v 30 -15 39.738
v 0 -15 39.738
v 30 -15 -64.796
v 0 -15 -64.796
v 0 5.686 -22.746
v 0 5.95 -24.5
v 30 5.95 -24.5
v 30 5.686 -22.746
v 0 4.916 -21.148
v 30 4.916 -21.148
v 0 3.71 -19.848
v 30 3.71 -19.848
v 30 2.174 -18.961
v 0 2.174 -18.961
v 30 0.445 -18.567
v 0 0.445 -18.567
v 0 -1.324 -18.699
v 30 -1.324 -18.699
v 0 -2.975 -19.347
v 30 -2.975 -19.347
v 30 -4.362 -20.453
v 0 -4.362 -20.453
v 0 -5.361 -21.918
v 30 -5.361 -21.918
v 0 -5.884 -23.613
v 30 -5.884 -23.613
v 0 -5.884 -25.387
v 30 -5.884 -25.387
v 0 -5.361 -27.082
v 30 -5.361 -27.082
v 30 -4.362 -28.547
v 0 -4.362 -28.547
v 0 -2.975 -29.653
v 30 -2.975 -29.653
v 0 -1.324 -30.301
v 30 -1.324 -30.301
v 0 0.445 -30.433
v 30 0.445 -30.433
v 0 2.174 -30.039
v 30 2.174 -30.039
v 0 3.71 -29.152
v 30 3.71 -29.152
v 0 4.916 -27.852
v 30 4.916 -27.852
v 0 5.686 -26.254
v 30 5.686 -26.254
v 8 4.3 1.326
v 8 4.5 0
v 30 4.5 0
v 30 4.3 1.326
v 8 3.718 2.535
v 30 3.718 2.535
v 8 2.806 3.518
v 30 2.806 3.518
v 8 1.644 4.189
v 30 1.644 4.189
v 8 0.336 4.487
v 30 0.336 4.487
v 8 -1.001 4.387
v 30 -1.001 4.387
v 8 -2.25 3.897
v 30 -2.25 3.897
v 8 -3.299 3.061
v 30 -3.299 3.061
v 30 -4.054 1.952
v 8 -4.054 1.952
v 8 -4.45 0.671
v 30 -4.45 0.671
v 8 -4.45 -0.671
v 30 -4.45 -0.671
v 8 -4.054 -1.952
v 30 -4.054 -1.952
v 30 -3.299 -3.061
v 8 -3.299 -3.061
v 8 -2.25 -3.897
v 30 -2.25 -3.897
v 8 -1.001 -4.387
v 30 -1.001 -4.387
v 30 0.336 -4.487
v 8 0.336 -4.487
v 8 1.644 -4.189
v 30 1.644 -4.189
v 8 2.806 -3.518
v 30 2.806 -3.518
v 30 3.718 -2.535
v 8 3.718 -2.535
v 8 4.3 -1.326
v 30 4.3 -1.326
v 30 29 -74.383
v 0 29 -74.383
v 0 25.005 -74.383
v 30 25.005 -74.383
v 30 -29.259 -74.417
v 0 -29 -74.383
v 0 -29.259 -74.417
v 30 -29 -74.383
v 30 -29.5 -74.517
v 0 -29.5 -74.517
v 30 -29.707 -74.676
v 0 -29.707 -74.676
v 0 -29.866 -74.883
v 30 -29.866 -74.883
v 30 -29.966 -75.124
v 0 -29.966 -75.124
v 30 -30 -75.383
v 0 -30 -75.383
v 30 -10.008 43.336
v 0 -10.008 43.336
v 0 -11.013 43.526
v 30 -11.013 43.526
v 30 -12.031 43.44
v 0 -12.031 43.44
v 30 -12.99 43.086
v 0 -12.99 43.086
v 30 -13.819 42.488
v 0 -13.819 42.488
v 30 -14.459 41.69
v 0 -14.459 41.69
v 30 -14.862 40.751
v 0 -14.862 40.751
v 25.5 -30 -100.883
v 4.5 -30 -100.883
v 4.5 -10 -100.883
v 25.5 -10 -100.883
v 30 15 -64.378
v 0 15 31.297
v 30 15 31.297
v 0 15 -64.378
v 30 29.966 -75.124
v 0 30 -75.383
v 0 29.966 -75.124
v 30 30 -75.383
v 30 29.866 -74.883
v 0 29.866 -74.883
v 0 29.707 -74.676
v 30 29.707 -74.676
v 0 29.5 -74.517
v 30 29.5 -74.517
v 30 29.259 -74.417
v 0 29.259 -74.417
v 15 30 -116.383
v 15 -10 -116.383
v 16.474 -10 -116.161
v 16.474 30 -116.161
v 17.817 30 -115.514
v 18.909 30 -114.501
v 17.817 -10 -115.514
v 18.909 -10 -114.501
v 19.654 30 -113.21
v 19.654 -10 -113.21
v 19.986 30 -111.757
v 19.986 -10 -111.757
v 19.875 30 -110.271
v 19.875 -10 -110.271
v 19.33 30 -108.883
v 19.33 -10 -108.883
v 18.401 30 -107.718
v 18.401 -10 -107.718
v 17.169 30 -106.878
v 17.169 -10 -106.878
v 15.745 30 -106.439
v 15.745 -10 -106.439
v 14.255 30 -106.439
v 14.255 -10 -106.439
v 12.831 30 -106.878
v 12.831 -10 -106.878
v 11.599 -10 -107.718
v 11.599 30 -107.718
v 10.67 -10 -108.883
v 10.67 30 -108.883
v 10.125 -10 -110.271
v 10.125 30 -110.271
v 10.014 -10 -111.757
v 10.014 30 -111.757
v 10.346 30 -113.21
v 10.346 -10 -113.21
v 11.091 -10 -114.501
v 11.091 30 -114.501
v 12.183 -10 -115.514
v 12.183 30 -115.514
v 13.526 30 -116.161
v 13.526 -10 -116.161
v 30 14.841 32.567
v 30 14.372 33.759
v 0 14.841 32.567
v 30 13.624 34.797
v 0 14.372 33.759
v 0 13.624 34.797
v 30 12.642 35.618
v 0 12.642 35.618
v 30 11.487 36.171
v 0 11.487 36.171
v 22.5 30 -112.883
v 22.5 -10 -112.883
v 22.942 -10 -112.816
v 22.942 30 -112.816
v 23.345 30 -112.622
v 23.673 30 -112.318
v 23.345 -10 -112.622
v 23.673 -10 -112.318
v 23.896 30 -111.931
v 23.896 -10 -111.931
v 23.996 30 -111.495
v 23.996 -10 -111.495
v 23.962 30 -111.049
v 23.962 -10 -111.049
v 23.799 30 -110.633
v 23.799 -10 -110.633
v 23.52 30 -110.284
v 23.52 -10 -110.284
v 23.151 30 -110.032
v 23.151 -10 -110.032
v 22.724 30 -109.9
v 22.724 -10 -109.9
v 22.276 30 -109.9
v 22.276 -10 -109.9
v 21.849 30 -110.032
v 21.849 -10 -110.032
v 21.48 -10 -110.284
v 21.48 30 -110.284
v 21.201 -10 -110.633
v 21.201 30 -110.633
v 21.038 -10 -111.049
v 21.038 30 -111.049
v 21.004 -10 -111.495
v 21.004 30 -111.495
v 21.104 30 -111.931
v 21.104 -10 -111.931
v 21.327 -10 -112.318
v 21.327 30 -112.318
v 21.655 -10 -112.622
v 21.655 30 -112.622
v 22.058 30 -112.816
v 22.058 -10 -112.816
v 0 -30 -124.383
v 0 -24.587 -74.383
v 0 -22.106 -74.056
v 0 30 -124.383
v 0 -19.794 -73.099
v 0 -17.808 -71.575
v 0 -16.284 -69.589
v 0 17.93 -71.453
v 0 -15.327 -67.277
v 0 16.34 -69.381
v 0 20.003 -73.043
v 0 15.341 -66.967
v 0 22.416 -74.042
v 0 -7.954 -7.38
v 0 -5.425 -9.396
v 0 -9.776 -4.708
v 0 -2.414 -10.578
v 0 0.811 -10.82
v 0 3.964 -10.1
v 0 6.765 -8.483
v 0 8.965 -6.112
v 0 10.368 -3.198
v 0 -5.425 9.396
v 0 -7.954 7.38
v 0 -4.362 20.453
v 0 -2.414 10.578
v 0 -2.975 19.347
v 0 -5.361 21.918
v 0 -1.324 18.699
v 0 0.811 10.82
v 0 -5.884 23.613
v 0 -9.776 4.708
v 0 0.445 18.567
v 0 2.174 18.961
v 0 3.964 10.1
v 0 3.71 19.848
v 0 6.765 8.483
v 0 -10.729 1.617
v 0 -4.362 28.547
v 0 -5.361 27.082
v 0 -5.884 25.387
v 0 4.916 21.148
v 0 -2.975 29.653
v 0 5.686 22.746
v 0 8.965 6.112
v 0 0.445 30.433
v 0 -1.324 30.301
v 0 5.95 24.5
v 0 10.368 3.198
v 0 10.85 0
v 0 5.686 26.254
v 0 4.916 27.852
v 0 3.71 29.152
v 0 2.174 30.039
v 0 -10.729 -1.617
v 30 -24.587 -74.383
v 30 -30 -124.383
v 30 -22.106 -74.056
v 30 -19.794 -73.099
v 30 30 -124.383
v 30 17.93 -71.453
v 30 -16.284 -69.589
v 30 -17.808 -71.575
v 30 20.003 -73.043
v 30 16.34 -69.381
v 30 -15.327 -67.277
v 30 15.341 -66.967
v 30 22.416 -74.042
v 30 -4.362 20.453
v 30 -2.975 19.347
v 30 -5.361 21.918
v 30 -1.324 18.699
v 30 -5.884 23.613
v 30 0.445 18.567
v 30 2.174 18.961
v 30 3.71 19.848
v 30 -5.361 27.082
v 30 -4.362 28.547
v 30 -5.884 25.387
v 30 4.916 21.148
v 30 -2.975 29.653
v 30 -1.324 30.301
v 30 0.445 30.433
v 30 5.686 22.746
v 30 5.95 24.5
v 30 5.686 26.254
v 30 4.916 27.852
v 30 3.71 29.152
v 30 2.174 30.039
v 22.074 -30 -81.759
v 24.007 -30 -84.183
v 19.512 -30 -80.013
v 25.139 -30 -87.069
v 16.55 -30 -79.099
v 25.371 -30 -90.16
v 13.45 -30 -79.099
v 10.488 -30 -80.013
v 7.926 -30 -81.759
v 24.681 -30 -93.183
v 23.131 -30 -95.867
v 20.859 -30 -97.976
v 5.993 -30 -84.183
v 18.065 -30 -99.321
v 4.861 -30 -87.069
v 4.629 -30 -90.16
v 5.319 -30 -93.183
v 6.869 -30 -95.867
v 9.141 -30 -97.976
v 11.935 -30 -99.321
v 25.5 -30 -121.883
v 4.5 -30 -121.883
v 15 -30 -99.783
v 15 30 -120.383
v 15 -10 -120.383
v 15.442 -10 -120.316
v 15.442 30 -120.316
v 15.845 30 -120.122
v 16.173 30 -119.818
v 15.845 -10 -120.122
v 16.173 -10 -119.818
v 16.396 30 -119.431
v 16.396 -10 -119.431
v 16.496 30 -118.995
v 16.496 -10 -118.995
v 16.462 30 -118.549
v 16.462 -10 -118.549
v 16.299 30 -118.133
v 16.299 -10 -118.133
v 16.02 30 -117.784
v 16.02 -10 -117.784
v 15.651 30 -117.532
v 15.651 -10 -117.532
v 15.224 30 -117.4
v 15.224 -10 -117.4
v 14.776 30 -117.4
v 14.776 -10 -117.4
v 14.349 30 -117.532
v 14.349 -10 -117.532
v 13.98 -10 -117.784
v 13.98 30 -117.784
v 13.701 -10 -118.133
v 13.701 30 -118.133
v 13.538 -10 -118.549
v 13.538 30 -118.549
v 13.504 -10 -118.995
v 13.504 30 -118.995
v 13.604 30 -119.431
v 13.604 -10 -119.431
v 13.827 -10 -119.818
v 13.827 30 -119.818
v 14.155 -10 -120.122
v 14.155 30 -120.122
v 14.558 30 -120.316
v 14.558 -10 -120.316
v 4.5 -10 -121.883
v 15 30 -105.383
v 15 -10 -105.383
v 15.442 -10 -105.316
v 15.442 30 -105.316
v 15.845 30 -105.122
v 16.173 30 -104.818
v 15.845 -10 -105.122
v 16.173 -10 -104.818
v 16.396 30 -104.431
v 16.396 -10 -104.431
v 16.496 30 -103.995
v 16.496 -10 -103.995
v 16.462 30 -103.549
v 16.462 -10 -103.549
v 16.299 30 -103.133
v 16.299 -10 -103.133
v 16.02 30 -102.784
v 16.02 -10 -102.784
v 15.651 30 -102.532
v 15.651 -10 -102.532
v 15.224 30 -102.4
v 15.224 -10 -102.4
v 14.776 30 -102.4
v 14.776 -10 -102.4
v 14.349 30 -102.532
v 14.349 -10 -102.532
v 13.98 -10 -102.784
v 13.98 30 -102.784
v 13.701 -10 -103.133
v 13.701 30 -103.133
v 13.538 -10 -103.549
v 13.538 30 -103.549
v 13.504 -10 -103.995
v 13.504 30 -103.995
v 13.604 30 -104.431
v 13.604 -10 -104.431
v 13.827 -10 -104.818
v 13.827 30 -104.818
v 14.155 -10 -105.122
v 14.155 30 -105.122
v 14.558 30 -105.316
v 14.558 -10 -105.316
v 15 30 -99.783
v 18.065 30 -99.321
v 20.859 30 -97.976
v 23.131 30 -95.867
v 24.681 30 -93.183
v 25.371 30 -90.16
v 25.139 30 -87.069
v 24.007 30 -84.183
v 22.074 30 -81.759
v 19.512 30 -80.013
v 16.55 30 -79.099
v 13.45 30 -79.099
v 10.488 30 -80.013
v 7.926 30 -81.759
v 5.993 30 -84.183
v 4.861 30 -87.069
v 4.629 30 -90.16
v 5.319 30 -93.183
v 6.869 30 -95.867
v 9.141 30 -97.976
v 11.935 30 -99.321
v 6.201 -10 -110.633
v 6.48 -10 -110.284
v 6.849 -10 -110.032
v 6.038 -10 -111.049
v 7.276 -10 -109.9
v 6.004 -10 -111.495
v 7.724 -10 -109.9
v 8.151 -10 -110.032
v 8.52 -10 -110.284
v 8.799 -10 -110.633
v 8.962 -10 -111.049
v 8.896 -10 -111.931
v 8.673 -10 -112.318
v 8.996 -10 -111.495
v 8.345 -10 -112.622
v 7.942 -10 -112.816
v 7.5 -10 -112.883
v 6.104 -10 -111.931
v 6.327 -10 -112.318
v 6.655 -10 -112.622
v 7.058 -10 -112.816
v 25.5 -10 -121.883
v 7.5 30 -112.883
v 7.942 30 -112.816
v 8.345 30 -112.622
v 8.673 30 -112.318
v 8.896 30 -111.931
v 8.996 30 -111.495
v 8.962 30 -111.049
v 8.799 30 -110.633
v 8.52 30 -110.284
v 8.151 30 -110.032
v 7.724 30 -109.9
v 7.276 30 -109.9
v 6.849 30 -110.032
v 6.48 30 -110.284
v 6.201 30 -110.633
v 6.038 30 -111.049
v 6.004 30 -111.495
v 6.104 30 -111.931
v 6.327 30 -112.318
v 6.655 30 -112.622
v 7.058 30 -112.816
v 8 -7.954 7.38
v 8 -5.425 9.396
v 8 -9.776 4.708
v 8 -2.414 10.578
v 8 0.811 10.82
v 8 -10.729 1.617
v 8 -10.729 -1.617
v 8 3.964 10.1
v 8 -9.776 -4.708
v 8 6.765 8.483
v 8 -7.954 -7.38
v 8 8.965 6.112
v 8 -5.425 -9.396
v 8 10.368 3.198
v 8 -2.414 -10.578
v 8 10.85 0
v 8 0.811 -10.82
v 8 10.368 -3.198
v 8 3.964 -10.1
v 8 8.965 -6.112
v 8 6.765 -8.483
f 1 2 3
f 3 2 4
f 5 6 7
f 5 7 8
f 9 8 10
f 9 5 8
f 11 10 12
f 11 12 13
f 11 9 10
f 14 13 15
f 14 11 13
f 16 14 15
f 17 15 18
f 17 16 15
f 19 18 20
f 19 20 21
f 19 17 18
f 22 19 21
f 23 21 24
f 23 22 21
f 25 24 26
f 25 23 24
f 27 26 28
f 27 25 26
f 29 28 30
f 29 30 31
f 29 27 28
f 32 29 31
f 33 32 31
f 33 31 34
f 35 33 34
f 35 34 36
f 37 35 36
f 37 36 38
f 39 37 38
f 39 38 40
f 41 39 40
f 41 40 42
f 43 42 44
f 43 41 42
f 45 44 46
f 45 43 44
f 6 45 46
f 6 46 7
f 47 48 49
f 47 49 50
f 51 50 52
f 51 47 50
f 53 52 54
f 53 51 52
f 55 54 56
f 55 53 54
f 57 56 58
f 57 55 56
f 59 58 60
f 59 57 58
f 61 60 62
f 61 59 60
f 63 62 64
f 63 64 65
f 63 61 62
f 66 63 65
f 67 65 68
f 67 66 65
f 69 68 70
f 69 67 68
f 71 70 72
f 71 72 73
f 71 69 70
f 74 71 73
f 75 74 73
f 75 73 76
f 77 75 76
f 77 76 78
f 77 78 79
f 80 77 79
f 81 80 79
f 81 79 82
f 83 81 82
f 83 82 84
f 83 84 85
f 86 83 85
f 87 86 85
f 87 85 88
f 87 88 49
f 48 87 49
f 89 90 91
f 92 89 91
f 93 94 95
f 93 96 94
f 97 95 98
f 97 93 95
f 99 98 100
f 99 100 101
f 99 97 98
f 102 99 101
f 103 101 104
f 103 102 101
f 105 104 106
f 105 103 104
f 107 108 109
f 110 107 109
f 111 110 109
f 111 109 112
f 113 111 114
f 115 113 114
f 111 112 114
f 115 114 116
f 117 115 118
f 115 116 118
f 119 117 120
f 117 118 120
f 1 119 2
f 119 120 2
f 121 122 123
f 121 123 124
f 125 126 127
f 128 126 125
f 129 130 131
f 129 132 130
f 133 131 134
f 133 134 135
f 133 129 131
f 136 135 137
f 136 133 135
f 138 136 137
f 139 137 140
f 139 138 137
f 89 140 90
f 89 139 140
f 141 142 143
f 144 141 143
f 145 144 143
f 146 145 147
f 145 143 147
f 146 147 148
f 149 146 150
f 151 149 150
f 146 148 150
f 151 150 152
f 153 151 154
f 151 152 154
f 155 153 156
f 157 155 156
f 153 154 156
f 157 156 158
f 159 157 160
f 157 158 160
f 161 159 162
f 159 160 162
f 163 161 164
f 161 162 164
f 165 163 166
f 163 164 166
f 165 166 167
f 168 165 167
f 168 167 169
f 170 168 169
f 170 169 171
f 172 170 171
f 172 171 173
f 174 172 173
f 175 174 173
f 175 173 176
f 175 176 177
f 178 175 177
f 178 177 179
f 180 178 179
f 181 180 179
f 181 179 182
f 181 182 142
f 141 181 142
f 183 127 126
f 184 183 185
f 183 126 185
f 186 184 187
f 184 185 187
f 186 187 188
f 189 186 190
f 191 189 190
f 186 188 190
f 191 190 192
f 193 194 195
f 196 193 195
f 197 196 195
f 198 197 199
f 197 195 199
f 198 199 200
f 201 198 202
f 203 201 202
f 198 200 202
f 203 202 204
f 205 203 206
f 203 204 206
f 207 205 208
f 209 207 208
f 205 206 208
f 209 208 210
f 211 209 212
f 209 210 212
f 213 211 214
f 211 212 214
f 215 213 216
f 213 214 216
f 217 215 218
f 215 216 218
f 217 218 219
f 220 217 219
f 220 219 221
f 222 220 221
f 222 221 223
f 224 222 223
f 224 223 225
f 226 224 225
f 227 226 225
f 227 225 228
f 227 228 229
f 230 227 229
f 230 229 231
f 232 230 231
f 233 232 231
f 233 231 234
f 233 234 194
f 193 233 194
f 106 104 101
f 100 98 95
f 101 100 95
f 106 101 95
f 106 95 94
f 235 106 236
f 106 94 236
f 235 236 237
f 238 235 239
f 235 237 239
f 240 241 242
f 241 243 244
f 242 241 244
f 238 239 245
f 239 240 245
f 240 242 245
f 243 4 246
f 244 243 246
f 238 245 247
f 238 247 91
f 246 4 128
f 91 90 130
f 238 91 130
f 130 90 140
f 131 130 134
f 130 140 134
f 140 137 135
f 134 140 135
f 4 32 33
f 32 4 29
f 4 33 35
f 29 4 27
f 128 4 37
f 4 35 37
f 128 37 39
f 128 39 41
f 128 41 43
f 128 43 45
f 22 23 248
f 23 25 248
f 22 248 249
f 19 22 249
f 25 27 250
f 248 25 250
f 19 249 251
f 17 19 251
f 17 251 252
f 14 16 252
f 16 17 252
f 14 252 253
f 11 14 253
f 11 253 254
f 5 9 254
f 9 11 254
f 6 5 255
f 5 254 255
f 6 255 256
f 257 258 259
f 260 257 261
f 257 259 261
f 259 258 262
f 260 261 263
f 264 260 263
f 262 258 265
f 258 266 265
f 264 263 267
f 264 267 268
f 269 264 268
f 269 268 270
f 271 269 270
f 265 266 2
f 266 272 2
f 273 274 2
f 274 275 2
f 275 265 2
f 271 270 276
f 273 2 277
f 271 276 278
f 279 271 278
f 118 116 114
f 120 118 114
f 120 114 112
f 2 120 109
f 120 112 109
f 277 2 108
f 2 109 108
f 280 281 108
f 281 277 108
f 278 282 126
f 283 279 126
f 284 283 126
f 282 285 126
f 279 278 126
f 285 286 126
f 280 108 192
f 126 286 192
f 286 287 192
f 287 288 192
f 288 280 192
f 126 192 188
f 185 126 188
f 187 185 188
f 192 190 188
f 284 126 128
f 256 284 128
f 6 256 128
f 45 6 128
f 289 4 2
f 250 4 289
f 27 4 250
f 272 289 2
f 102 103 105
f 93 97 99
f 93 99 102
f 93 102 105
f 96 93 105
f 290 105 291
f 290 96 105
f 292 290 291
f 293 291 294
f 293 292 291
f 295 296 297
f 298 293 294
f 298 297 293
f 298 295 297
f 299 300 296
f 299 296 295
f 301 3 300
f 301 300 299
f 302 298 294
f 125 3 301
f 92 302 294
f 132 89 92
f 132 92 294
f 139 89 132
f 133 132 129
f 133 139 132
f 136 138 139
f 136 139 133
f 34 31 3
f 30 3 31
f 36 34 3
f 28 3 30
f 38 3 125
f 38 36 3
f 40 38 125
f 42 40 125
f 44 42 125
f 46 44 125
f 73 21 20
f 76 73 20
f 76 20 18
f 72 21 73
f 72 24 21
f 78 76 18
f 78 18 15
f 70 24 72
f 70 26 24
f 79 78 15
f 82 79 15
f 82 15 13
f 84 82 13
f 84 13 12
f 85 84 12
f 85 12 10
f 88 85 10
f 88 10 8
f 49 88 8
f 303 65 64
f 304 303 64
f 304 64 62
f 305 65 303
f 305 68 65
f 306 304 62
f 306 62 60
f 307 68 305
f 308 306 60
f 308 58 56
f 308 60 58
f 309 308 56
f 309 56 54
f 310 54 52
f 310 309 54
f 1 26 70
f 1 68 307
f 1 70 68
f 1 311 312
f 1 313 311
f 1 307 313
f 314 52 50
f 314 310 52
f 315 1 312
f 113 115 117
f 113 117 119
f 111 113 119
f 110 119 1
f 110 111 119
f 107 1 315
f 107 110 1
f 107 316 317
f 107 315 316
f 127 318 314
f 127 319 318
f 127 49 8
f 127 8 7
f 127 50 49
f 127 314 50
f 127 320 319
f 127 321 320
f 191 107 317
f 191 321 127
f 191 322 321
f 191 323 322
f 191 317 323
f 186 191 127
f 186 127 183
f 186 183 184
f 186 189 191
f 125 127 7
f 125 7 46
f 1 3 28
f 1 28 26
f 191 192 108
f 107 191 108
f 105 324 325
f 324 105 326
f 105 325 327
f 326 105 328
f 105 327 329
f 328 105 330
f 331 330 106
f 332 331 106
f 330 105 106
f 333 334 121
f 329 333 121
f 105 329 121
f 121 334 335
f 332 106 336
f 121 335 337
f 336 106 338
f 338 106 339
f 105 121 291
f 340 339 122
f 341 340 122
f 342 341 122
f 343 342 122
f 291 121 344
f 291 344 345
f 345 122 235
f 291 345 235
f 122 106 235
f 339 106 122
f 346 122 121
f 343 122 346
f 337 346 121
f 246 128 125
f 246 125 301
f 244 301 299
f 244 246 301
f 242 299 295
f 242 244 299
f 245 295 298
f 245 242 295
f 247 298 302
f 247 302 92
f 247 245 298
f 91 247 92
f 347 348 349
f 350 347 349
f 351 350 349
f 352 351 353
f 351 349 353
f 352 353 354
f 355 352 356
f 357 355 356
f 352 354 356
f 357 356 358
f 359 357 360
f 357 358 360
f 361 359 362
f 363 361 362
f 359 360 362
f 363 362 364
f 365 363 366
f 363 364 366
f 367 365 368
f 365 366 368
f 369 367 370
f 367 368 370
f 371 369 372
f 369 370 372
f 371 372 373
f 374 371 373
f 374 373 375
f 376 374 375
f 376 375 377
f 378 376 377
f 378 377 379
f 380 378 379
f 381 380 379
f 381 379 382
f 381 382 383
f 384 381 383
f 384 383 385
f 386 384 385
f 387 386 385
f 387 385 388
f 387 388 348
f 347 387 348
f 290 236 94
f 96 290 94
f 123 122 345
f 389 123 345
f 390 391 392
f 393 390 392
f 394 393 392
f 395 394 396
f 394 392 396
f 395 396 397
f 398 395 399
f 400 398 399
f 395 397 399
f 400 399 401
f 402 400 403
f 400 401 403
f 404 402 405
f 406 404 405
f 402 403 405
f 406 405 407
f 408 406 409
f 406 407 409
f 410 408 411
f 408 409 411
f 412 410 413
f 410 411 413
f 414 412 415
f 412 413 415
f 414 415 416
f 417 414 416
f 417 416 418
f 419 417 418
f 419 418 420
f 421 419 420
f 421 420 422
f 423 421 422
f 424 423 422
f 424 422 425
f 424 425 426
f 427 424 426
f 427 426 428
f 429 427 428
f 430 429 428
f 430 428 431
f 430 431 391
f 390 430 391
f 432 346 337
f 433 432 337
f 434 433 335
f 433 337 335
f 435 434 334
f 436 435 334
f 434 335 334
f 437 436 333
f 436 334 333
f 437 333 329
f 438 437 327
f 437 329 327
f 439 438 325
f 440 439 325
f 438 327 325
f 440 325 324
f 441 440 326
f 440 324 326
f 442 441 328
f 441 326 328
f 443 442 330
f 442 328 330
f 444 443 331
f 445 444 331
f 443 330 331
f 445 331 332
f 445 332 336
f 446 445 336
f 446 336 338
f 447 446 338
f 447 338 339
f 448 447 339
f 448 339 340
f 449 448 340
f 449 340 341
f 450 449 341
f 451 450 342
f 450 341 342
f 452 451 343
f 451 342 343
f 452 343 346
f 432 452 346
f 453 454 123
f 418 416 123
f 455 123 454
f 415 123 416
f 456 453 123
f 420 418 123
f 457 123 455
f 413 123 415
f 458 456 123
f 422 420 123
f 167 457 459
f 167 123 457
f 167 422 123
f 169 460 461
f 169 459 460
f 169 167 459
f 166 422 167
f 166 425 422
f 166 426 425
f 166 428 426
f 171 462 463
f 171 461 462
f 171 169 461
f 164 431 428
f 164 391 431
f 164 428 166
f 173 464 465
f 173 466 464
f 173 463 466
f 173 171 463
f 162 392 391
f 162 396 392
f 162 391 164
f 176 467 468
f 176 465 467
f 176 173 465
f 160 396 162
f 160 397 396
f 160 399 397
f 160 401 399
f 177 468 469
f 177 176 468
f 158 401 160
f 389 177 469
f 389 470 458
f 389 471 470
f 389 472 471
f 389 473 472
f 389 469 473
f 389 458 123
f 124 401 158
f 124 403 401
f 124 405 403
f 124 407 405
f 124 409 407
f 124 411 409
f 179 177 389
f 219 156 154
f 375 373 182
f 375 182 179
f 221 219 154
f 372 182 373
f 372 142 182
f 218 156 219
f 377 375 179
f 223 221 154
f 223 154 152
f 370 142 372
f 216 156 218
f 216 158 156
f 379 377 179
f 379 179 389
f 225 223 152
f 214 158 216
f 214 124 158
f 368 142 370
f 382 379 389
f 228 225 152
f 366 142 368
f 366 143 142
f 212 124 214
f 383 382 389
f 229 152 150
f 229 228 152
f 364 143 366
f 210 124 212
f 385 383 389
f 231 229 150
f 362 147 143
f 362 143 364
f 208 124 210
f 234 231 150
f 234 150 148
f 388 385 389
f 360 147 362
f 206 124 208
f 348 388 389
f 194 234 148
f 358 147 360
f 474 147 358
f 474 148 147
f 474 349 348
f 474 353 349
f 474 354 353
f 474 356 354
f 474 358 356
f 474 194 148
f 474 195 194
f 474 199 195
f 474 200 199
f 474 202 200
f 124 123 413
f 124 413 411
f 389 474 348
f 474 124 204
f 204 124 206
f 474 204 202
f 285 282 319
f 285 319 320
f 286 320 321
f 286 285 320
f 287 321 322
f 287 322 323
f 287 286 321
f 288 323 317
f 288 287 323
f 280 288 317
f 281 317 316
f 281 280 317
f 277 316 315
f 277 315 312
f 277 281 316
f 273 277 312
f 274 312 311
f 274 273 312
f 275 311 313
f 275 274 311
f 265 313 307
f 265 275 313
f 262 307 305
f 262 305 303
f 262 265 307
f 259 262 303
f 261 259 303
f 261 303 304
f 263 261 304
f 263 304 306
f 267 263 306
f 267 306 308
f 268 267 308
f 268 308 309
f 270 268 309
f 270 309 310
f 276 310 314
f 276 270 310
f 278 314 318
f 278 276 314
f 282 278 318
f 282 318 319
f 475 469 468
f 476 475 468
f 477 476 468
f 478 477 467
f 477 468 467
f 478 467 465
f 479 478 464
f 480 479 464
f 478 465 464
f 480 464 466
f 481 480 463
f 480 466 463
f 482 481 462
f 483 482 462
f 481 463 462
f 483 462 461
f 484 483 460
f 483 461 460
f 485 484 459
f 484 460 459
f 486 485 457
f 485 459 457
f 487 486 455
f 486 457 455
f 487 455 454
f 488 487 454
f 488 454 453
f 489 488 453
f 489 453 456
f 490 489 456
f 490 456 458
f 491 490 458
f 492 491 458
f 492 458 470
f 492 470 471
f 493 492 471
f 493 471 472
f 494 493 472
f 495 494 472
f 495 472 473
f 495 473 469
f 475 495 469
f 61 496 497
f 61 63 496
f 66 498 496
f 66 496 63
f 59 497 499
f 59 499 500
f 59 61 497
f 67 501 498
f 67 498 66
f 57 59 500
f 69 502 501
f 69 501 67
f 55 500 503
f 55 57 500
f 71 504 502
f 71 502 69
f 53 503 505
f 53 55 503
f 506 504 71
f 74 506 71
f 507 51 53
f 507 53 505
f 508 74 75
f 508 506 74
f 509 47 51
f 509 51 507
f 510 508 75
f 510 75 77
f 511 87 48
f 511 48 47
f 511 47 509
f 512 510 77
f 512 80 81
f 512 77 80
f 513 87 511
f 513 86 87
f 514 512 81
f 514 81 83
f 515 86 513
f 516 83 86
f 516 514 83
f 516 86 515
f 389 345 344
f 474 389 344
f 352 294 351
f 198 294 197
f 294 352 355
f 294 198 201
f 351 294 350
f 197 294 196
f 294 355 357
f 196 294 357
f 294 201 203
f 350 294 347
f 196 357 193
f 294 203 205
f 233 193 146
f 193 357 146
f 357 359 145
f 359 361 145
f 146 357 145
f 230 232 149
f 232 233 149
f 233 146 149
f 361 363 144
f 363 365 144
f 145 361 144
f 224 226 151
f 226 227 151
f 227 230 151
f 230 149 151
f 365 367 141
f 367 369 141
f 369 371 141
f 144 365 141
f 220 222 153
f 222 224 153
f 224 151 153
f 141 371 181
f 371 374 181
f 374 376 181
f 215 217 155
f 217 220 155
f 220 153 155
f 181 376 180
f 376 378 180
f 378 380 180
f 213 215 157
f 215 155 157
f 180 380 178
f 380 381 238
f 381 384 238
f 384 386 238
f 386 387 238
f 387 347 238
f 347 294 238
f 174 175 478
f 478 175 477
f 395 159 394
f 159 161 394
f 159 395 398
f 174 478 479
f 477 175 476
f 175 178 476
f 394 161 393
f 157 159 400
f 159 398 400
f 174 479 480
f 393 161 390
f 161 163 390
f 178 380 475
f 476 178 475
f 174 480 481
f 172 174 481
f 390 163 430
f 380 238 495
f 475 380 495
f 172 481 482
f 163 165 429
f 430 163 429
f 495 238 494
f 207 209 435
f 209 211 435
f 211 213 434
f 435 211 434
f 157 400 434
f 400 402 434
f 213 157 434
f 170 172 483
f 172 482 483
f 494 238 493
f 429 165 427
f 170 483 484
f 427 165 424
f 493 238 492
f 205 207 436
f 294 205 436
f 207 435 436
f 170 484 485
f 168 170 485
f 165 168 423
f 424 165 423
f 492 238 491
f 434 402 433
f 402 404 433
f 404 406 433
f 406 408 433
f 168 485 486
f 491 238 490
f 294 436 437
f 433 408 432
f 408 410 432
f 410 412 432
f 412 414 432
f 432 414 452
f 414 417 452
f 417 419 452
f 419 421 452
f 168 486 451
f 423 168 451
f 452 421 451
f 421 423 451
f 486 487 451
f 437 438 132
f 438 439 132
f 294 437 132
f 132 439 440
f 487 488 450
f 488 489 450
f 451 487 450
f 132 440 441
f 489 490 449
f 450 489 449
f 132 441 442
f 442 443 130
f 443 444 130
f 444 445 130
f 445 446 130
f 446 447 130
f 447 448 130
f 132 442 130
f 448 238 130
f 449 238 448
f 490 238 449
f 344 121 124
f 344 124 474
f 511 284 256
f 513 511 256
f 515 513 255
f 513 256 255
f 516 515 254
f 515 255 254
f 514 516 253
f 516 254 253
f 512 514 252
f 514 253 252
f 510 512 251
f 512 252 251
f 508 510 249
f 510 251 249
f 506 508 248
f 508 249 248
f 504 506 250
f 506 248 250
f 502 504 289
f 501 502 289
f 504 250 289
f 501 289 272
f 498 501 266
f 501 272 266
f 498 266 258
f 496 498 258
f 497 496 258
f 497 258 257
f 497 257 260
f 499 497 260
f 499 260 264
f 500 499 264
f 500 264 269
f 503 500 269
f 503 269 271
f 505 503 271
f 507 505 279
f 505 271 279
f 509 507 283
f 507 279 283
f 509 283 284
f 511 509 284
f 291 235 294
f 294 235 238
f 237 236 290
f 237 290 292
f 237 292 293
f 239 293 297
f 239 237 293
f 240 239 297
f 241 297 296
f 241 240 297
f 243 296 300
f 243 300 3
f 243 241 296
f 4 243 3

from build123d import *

# Parameters (mm, degrees)
SKETCH_R        = 5.95
SKETCH_R_2      = 4.5
PAD_DEPTH       = 30
SKETCH001_R     = 10.85
POCKET_DEPTH    = 8
SKETCH002_R     = 10.4
SKETCH002_R_2   = 5
SKETCH002_R_3   = 1.5
POCKET001_DEPTH = 60
SKETCH003_W     = 21
SKETCH003_H     = 21
POCKET002_DEPTH = 20
FILLET_R        = 1


with BuildPart() as part:
    # Sketch → Pad (new body)
    with BuildSketch(Plane.YZ):
        with BuildLine():
            Line((-15, 39.738024), (-15, -45))
            Line((-15, -45), (-15, -64.795761))
            ThreePointArc((-24.587379, -74.38314), (-17.808078, -71.575062), (-15, -64.795761))
            Line((-24.587379, -74.38314), (-30, -74.38314))
            Line((-30, -74.38314), (-30, -124.38314))
            Line((-30, -124.38314), (30, -124.38314))
            Line((30, -124.38314), (30, -74.38314))
            Line((30, -74.38314), (25.005197, -74.38314))
            ThreePointArc((15, -64.377943), (17.930454, -71.452686), (25.005197, -74.38314))
            Line((15, -45), (15, -64.377943))
            Line((15, 31.297371), (15, -45))
            ThreePointArc((15, 31.297371), (14.030328, 34.3011), (11.487377, 36.170874))
            Line((11.487377, 36.170874), (-10.008051, 43.336017))
            ThreePointArc((-10.008051, 43.336017), (-13.424965, 42.814755), (-15, 39.738024))
        make_face()
        with Locations((0, 24.5)):
            Circle(SKETCH_R, mode=Mode.SUBTRACT)
        with Locations((0, -24.5)):
            Circle(SKETCH_R, mode=Mode.SUBTRACT)
        Circle(SKETCH_R_2, mode=Mode.SUBTRACT)
    extrude(amount=PAD_DEPTH)

    # Sketch001 (on Face18 of Pad) → Pocket (cut)
    with BuildSketch(Plane(origin=(0, 0, 0), x_dir=(0, 1, 0), z_dir=(-1, 0, 0))):
        Circle(SKETCH001_R)
    extrude(amount=-POCKET_DEPTH, mode=Mode.SUBTRACT)

    # Sketch002 (on Face16 of Pocket) → Pocket001 (cut)
    with BuildSketch(Plane(origin=(0, -30, 0), x_dir=(0, 0, -1), z_dir=(0, -1, 0))):
        with Locations((89.38314, 15)):
            Circle(SKETCH002_R)
        with Locations((111.38314, 15)):
            Circle(SKETCH002_R_2)
        with Locations((111.38314, 22.5)):
            Circle(SKETCH002_R_3)
        with Locations((103.88314, 15)):
            Circle(SKETCH002_R_3)
        with Locations((111.38314, 7.5)):
            Circle(SKETCH002_R_3)
        with Locations((118.88314, 15)):
            Circle(SKETCH002_R_3)
    extrude(amount=-POCKET001_DEPTH, mode=Mode.SUBTRACT)

    # Sketch003 (on Face16 of Pocket001) → Pocket002 (cut)
    with BuildSketch(Plane(origin=(0, -30, 0), x_dir=(0, 0, -1), z_dir=(0, -1, 0))):
        with Locations((111.38314, 15)):
            Rectangle(SKETCH003_W, SKETCH003_H)
    extrude(amount=-POCKET002_DEPTH, mode=Mode.SUBTRACT)

    # Fillet
    fillet_edges = [part.edges().sort_by_distance(p)[0] for p in [
        (15, -30, -74.38314),
        (15, 30, -74.38314),
    ]]
    fillet(fillet_edges, radius=FILLET_R)


solid = part.part
